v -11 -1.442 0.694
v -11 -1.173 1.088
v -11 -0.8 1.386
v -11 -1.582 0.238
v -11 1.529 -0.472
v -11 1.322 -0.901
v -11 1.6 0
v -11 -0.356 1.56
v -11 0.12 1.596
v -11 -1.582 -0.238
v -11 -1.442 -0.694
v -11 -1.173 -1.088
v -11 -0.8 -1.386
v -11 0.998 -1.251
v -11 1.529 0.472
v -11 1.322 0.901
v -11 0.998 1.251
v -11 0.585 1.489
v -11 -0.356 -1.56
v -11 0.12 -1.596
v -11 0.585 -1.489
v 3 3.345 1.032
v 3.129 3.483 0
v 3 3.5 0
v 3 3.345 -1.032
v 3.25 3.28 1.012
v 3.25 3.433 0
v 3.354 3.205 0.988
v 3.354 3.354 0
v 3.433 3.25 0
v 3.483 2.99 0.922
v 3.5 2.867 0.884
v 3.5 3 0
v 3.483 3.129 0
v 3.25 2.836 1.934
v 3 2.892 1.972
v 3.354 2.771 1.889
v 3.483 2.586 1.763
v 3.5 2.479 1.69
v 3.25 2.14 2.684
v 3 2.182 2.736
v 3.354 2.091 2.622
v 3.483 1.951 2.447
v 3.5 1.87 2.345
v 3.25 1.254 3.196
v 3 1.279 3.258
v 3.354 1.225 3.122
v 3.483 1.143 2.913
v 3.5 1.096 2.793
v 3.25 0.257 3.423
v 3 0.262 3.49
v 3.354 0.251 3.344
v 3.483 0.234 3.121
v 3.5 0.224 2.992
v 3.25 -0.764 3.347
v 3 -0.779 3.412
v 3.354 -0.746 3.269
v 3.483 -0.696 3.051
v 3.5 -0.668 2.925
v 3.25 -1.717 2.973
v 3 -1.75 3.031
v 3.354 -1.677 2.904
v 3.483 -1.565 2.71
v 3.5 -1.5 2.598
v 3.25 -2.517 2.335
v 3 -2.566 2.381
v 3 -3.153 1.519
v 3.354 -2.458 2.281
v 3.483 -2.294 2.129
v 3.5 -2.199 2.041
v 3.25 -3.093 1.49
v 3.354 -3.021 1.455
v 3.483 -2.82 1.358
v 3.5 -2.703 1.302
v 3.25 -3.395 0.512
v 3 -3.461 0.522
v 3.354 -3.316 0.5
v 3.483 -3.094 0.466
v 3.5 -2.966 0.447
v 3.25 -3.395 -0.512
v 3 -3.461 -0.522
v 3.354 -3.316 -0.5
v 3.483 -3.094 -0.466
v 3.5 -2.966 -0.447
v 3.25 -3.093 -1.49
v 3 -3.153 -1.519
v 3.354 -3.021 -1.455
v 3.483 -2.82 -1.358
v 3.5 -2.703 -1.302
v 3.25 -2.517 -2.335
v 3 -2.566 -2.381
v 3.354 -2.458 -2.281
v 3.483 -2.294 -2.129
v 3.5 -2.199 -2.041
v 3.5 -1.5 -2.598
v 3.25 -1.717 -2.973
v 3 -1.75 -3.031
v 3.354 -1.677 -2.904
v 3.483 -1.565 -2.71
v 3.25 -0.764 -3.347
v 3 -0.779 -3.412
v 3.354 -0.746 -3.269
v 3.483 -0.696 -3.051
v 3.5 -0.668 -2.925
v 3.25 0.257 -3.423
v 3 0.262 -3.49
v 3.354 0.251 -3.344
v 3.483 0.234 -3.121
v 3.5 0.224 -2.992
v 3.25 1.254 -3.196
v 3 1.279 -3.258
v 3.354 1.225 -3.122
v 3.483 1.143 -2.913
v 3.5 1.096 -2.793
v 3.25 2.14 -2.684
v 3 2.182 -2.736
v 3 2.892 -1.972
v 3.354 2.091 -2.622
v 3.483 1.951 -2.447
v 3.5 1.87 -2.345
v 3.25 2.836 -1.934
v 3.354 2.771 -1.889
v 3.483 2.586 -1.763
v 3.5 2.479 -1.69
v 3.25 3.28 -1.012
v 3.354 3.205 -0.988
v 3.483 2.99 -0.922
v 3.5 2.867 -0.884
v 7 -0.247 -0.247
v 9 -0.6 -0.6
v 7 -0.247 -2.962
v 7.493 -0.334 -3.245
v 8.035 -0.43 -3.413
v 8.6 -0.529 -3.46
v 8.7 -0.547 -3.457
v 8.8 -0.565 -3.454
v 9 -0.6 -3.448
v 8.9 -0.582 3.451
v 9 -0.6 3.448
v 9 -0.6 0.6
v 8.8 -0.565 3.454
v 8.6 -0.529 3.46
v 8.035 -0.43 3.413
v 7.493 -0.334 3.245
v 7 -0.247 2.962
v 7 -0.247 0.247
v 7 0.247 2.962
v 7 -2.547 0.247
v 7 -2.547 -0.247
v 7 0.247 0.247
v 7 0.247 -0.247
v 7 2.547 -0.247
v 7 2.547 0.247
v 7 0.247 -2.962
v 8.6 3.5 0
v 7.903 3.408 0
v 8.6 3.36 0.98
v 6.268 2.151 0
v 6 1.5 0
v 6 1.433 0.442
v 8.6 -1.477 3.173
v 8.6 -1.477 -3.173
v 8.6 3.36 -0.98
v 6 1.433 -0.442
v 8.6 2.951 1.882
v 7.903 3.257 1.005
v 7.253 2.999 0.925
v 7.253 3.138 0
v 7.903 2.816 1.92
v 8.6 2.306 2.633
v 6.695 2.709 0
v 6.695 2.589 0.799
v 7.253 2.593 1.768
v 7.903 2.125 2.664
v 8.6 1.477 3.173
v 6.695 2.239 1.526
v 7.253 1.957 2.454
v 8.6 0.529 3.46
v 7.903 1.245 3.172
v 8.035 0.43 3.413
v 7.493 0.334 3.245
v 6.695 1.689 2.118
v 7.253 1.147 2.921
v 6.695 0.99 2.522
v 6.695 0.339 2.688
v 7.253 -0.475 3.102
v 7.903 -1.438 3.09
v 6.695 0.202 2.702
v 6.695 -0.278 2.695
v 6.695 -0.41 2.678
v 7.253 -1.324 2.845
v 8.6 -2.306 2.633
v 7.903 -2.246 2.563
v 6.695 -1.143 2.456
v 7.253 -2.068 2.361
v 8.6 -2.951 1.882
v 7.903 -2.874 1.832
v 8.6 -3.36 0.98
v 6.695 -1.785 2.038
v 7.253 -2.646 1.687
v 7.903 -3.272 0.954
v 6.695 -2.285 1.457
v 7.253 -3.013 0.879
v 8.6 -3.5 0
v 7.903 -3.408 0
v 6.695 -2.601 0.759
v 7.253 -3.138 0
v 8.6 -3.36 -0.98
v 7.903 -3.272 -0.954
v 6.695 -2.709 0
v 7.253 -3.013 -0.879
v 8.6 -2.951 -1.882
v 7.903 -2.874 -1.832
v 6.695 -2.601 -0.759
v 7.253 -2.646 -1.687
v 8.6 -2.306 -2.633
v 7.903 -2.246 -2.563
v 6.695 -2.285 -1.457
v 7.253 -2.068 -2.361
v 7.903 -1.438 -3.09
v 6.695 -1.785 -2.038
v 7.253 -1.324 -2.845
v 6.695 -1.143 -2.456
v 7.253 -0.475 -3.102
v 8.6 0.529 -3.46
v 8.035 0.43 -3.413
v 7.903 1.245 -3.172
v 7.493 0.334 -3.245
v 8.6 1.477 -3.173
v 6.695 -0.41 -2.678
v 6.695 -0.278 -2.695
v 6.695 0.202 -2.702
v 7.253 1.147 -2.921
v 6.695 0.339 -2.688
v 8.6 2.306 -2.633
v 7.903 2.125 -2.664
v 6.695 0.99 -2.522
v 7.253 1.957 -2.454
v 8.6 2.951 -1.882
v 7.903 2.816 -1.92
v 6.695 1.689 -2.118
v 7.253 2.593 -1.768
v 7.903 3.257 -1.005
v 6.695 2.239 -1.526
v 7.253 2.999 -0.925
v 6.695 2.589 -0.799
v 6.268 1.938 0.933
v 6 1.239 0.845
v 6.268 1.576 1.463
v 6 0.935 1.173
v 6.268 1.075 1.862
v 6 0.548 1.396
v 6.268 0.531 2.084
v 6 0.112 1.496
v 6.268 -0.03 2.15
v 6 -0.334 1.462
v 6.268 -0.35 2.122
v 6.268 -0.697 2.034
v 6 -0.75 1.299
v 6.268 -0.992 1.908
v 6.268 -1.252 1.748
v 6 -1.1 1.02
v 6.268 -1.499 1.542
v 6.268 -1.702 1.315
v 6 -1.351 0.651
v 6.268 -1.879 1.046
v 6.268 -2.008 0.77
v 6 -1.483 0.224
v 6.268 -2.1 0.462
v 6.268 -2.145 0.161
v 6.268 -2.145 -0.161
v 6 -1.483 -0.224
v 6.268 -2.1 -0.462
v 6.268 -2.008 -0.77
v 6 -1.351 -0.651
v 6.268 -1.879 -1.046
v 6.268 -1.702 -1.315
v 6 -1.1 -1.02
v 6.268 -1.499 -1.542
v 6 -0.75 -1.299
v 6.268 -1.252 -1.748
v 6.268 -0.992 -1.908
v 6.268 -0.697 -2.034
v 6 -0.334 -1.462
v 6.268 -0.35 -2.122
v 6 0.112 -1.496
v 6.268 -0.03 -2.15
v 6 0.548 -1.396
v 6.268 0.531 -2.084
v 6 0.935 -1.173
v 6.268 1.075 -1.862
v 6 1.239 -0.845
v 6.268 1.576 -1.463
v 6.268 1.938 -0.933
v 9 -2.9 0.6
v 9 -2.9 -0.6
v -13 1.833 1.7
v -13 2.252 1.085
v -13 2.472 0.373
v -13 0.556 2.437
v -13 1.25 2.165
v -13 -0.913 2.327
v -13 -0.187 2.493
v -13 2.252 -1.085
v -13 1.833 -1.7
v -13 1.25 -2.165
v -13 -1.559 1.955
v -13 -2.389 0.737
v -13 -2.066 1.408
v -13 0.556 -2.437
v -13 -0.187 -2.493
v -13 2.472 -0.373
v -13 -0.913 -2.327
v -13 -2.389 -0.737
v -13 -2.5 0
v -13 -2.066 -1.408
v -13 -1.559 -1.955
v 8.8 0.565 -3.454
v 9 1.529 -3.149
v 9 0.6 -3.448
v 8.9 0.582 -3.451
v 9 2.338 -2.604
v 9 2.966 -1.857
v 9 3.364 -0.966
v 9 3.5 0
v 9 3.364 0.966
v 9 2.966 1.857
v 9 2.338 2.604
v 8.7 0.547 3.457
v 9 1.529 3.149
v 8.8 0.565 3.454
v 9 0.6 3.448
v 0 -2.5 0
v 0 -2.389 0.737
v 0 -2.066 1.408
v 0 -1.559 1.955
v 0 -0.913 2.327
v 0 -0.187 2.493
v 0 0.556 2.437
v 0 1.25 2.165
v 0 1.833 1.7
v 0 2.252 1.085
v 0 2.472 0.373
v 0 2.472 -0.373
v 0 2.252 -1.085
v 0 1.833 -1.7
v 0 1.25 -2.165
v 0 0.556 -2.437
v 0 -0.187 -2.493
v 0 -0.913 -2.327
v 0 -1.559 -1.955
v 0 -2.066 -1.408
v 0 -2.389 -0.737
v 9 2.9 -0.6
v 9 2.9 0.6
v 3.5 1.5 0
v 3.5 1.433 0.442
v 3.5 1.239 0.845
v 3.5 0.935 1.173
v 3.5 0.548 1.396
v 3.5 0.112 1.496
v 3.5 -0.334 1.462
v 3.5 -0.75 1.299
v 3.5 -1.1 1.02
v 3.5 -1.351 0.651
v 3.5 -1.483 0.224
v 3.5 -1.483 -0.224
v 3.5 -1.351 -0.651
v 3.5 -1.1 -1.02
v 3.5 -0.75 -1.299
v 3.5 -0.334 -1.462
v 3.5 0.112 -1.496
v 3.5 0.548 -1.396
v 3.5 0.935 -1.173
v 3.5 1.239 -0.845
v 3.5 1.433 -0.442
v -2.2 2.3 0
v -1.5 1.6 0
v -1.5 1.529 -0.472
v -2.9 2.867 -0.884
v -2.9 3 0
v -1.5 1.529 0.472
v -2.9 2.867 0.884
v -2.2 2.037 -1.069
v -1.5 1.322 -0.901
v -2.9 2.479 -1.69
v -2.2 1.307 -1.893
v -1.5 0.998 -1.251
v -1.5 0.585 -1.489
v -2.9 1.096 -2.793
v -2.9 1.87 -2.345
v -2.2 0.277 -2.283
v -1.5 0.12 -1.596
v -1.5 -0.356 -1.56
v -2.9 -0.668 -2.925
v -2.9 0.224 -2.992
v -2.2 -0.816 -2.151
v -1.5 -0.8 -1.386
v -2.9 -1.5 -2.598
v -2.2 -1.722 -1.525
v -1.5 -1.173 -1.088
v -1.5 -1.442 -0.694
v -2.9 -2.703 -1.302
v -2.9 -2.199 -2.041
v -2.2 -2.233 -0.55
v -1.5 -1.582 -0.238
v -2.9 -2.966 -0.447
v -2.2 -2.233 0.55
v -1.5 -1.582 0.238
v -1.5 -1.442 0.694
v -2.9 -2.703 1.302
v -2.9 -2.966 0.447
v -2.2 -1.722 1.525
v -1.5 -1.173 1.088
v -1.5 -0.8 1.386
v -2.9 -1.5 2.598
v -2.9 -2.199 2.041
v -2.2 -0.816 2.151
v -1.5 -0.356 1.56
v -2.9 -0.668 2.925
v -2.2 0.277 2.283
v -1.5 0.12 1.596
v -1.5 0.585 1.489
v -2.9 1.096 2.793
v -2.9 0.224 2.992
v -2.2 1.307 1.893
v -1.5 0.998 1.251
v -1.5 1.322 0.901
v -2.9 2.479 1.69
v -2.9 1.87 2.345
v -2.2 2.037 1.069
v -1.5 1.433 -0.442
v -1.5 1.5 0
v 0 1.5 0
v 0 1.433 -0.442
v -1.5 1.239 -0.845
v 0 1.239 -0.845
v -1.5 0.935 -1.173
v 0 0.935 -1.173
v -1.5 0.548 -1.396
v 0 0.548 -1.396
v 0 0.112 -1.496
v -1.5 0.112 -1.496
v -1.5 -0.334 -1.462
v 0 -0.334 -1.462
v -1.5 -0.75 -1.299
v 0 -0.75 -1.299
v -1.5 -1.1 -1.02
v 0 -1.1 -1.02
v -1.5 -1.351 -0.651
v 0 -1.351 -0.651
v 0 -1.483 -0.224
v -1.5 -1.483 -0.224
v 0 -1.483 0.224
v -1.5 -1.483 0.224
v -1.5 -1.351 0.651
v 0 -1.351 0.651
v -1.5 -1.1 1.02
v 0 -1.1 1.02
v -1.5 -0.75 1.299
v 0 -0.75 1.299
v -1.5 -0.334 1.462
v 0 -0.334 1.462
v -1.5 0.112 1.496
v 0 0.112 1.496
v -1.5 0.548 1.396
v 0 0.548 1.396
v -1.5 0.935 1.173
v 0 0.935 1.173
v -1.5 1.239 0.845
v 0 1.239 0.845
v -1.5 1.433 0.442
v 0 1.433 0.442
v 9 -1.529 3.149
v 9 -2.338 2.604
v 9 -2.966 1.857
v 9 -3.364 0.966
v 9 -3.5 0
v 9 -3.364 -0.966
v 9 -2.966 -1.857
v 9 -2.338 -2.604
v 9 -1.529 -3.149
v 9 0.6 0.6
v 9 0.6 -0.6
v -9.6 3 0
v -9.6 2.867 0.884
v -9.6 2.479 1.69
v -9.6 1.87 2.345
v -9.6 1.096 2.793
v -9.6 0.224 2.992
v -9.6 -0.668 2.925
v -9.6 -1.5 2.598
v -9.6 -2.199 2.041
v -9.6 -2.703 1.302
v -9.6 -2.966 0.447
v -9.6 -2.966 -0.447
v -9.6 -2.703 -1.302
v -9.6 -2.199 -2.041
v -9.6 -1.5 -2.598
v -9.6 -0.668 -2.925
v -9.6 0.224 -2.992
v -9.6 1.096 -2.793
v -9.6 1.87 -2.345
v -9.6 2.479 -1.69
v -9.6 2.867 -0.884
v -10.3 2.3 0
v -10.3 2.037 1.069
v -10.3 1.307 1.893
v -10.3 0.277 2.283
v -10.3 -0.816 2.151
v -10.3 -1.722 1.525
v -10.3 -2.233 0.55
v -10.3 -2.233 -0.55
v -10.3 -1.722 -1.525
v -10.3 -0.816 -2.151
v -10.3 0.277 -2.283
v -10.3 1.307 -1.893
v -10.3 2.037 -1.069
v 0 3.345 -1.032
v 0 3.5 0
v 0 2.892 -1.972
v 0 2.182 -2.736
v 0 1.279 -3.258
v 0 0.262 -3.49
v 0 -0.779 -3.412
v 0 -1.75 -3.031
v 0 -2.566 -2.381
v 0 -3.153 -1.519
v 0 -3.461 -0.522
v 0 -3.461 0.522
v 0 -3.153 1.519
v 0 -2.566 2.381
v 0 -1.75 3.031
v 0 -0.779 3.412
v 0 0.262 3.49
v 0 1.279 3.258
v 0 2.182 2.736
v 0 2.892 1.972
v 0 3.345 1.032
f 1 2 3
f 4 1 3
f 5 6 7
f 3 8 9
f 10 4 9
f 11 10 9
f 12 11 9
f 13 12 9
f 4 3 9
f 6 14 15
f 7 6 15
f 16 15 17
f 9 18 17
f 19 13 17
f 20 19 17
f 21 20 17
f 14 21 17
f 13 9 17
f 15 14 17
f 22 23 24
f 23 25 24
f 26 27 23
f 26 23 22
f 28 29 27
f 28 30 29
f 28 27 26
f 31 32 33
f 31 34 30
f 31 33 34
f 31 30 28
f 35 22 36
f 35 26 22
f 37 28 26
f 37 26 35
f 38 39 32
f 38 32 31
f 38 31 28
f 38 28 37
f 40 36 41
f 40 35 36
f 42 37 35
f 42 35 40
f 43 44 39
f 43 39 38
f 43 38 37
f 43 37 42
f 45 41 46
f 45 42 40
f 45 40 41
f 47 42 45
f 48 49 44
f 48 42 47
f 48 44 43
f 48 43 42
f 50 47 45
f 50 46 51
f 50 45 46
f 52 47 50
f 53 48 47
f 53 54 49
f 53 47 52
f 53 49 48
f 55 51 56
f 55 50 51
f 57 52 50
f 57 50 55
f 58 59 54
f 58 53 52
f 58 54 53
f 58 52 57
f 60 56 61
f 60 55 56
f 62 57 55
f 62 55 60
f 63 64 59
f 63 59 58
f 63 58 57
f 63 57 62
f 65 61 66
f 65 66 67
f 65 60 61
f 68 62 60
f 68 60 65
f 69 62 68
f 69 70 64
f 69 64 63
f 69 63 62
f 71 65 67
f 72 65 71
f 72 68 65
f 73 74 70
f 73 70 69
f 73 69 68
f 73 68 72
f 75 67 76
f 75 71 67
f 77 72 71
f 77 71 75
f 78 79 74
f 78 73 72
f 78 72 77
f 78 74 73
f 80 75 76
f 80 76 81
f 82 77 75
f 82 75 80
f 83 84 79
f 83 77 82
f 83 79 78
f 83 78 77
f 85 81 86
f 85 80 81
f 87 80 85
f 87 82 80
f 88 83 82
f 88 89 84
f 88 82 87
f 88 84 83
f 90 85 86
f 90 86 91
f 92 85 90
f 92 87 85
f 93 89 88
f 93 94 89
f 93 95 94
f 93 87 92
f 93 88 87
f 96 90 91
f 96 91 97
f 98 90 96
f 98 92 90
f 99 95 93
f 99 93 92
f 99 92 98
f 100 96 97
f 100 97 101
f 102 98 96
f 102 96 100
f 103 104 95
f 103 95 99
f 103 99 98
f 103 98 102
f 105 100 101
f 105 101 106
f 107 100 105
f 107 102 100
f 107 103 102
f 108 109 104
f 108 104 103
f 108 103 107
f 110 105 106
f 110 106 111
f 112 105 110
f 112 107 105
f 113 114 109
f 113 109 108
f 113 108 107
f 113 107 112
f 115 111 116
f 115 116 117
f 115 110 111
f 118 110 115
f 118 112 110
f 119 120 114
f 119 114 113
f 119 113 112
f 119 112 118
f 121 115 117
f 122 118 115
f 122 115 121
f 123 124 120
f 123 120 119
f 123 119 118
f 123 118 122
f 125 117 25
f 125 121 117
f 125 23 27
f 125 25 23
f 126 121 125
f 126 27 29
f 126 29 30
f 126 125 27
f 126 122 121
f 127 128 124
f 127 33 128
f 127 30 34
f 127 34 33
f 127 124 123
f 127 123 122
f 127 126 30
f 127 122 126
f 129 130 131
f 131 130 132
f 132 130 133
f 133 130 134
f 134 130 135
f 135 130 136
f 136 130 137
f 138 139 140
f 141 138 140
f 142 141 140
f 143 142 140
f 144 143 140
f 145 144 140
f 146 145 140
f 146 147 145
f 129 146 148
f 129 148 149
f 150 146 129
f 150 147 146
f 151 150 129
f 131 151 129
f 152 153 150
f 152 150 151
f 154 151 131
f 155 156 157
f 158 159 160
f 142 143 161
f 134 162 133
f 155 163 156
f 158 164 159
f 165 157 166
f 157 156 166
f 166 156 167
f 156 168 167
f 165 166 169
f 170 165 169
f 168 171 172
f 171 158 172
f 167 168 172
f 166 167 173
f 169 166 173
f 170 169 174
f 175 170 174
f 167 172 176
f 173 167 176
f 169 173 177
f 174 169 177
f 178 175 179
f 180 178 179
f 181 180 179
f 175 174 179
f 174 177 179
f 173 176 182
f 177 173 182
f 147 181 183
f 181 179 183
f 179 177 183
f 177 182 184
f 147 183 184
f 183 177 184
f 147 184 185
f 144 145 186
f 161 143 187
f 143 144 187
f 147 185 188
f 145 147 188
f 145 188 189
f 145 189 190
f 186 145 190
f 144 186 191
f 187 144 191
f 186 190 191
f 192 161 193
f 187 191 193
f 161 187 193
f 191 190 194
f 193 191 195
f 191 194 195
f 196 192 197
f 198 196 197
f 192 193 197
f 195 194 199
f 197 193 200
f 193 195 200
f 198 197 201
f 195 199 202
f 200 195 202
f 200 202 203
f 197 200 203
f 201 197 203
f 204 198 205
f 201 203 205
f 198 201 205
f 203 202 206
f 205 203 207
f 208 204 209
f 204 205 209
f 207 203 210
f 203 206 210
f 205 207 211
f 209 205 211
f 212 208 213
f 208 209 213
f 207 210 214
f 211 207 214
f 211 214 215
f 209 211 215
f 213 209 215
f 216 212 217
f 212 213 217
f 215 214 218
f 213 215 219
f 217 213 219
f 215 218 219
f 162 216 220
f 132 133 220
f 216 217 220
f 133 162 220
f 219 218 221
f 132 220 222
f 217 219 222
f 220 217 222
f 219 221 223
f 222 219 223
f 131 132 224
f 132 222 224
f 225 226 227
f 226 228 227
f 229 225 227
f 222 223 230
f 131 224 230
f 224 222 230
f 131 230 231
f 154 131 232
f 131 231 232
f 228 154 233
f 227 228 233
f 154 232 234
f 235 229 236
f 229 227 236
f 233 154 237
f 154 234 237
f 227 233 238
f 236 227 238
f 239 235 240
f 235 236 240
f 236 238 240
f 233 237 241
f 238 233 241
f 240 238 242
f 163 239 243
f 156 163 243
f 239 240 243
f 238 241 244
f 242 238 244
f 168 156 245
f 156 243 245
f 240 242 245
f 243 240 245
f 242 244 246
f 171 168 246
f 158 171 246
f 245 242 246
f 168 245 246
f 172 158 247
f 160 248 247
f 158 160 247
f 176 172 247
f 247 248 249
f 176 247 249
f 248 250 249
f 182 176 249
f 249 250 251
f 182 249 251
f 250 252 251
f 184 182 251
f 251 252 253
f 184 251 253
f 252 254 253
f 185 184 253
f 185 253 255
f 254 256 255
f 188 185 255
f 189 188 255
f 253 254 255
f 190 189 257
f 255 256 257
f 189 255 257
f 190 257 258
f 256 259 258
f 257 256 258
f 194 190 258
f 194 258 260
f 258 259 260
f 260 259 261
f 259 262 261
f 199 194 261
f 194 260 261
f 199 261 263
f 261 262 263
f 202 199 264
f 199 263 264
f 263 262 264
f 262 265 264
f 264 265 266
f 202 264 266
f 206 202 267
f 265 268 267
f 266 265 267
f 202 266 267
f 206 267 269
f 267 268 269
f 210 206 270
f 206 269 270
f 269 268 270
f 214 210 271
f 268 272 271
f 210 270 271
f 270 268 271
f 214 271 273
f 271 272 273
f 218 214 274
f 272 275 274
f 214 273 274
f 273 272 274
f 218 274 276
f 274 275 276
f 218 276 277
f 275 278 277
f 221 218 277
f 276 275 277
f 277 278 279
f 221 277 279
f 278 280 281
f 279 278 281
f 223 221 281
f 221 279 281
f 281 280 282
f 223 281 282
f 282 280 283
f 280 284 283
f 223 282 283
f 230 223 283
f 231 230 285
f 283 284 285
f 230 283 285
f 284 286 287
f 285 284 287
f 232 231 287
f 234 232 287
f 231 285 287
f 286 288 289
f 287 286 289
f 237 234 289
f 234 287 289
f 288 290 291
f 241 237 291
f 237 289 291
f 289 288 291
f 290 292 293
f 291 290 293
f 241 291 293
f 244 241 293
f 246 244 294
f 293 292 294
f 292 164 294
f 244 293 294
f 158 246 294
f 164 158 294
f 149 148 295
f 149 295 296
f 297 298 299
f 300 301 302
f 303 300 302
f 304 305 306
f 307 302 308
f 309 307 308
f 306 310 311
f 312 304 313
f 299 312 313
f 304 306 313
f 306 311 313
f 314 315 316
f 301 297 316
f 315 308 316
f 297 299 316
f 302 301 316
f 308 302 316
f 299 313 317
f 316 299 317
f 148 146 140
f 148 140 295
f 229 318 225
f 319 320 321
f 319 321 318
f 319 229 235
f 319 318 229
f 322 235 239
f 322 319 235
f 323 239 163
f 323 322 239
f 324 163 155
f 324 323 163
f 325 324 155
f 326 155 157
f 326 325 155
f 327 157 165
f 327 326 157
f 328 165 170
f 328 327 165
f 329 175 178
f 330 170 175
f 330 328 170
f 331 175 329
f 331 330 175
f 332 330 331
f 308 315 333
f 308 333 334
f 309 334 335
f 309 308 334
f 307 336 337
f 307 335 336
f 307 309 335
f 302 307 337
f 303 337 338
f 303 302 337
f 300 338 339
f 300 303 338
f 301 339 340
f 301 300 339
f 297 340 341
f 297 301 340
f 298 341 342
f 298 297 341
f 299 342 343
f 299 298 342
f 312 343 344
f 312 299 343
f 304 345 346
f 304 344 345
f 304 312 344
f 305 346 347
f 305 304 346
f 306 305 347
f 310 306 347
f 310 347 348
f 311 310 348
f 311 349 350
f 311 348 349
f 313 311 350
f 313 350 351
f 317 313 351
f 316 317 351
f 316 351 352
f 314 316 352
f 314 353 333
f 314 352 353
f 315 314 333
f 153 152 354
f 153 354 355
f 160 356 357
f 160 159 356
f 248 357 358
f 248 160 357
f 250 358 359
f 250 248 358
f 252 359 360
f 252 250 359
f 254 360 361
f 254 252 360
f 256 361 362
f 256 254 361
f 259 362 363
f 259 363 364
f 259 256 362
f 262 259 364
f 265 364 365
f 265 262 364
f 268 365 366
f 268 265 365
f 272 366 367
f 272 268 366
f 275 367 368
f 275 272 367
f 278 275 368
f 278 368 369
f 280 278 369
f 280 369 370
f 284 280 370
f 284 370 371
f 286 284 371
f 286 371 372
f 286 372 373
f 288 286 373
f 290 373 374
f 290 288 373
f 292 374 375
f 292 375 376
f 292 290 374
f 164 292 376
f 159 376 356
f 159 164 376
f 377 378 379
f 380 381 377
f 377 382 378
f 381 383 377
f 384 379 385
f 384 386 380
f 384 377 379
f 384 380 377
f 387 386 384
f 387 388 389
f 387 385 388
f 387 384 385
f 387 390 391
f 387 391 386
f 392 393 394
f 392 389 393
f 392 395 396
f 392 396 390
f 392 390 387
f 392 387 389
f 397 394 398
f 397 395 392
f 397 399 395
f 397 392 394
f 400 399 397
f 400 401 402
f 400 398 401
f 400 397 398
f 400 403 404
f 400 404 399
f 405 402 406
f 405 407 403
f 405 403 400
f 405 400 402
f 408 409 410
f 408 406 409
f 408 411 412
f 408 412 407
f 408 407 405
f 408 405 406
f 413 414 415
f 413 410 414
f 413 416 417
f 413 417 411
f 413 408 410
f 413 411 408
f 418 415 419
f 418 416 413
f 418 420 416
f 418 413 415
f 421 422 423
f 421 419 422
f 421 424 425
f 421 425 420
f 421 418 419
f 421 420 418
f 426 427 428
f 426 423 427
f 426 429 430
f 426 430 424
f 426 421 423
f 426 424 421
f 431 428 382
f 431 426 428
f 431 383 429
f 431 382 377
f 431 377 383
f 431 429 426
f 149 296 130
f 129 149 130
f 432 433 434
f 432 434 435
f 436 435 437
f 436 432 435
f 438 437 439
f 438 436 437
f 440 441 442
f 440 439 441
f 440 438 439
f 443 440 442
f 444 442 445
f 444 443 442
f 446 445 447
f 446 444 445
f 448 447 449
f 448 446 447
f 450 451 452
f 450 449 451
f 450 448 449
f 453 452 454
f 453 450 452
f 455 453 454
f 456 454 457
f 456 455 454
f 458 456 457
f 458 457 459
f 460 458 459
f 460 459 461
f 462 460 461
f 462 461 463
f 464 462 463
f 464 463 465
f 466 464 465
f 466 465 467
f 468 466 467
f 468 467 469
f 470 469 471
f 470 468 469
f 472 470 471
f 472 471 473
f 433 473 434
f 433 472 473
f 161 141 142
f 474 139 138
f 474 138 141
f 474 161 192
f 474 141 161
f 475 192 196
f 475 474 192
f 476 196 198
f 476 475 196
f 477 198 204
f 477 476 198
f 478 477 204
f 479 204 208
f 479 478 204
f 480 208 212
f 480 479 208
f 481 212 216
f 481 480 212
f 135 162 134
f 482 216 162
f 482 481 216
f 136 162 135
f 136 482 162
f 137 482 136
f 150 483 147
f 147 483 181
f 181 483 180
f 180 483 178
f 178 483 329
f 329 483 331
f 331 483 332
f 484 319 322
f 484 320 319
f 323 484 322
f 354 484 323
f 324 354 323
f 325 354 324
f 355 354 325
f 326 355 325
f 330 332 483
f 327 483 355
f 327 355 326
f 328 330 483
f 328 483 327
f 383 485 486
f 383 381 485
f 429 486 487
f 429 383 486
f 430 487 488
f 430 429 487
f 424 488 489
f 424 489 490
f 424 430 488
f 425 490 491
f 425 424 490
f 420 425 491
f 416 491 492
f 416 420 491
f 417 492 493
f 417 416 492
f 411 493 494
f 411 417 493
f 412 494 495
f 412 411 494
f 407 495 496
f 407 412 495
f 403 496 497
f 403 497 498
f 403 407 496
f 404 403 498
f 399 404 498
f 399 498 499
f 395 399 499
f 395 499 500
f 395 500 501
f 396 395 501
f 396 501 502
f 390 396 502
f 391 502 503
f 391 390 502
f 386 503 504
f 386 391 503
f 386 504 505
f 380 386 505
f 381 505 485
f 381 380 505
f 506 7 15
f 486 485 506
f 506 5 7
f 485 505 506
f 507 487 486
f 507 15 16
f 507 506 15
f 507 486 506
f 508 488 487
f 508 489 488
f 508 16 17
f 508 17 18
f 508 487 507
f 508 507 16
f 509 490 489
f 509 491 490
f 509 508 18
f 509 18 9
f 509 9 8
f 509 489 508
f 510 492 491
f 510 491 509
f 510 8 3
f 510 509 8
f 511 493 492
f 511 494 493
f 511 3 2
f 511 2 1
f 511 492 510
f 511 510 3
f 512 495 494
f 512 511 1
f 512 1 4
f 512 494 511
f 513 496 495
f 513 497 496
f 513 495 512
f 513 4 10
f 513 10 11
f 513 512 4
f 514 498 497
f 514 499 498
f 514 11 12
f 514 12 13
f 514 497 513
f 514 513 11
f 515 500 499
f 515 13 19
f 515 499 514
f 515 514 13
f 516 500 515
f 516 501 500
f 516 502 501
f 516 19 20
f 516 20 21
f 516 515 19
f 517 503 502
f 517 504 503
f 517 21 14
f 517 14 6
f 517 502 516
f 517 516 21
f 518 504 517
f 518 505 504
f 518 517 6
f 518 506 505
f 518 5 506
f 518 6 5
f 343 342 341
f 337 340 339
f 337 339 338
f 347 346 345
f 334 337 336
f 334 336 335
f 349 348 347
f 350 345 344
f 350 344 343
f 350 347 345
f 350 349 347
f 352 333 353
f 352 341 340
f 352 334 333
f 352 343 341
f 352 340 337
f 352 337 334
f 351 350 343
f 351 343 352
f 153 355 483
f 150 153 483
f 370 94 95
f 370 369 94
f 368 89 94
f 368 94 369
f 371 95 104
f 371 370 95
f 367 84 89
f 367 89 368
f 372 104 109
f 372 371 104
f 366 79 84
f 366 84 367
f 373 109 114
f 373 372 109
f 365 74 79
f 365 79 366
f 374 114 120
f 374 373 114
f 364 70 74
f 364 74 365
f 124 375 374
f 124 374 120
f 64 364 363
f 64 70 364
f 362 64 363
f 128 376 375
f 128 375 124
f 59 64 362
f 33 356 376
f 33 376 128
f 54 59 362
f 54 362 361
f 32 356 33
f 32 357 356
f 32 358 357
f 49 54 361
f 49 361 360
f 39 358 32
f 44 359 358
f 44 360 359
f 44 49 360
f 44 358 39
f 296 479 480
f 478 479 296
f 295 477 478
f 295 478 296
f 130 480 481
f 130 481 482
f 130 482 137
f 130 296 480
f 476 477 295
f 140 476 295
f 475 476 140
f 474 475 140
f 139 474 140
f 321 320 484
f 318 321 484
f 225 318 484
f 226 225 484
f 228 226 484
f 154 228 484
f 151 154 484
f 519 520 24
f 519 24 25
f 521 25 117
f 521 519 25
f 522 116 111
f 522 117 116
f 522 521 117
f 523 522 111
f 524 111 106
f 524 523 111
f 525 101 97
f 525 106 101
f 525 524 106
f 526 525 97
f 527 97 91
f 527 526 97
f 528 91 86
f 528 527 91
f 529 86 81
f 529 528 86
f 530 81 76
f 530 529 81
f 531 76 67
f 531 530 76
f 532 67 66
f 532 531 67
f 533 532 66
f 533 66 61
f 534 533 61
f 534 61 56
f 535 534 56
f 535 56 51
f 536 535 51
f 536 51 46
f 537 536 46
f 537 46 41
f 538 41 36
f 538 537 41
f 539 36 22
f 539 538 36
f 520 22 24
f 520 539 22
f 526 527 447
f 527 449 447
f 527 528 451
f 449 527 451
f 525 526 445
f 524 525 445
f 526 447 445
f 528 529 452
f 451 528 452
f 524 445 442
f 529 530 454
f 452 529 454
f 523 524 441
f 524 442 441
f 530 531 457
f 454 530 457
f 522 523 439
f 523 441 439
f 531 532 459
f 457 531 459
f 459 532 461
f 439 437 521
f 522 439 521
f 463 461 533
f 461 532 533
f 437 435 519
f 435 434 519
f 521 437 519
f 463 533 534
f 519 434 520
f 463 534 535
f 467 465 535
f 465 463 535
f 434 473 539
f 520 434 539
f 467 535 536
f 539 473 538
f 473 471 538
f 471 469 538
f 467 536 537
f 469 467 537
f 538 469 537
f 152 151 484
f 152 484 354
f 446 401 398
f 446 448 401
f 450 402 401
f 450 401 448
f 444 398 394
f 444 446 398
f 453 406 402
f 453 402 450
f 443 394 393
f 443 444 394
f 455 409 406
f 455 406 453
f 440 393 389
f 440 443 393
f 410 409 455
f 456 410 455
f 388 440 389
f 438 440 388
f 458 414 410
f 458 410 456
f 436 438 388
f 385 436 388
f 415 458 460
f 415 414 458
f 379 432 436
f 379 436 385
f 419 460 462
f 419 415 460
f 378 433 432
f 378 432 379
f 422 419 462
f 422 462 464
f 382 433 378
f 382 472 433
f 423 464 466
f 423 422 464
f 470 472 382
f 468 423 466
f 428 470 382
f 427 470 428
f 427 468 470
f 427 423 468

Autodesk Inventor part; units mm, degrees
ref_plane "YZ Plane" through (0, 0, 0) normal (1, 0, 0) x (0, 1, 0)
ref_plane "XZ Plane" through (0, 0, 0) normal (0, 1, 0) x (-1, 0, 0)
ref_plane "XY Plane" through (0, 0, 0) normal (0, 0, 1) x (1, 0, 0)
sketch "Sketch1" plane through (0, 0, 0) normal (0, 0, 1) x (1, 0, 0)
  line L0 (-19.8, 0) -> (13.8, 0) projected
  line L1 (0, 0) -> (3.5, 0)
  line L2 (3.5, 0) -> (3.5, 3.5)
  line L3 (3.5, 3.5) -> (0, 3.5)
  line L4 (0, 3.5) -> (0, 0)
  line L5 (3.5, 1.5) -> (6, 1.5)
  arc A0 (8.6, 3.5) -> (6, 1.5) centre (8.6, 0.81) ccw
  line L6 (8.6, 3.5) -> (9, 3.5)
  line L7 (9, 3.5) -> (9, 0)
  line L8 (0, 1.5) -> (-1.5, 1.5)
  line L9 (-1.5, 1.5) -> (-1.5, 0)
  line L10 (-1.5, 0) -> (0, 0)
  line L11 (0, 0) -> (0, 1.5)
  line L12 (-11, 3) -> (-1.5, 3)
  line L13 (-1.5, 3) -> (-1.5, 0)
  line L14 (-1.5, 0) -> (-11, 0)
  line L15 (-11, 0) -> (-11, 3)
  point P0 (-11, 0)
  dimension "d0" = 7
  dimension "d1" = 9
  dimension "d2" = 0.4
  dimension "d18" = 3.5
  dimension "d19" = 3
  dimension "d20" = 2.5
  dimension "d21" = 1.5
  dimension "d22" = 6
  dimension "L" = 11
revolve "Revolution1" add sketch "Sketch1" angle 360 about axis through (-10, 0, 0) along (1, 0, 0)
chamfer "Chamfer1" distance 1.4 angle 45 2 edges at (-1.5, -3, 0) (-11, -3, 0)
fillet "Fillet1" radius 0.5 1 edges at (3.5, -3.5, 0)
sketch "Sketch3" plane through (9, 0, 0) normal (1, 0, 0) x (0, 0, -1)
  line L0 (-3.7, 0.6) -> (3.7, 0.6)
  line L1 (3.7, 0.6) -> (3.7, -0.6)
  line L2 (3.7, -0.6) -> (-3.7, -0.6)
  line L3 (-3.7, -0.6) -> (-3.7, 0.6)
  line L4 (-3.7, 0.6) -> (3.7, -0.6) construction
  line L5 (3.7, 0.6) -> (-3.7, -0.6) construction
  line L6 (-0.6, 2.9) -> (0.6, 2.9)
  line L7 (0.6, 2.9) -> (0.6, -2.9)
  line L8 (0.6, -2.9) -> (-0.6, -2.9)
  line L9 (-0.6, -2.9) -> (-0.6, 2.9)
  line L10 (-0.6, 2.9) -> (0.6, -2.9) construction
  line L11 (0.6, 2.9) -> (-0.6, -2.9) construction
  circle A0 centre (0, 0) radius 3.5 construction
  point P0 (-0.6, 3.448188)
  point P1 (-0.6, 0.6)
  point P2 (-3.448188, 0.6)
  point P3 (-3.448188, -0.6)
  point P4 (-0.6, -0.6)
  point P5 (-0.6, -3.448188)
  point P6 (0.6, -3.448188)
  point P7 (0.6, -0.6)
  point P8 (3.448188, -0.6)
  point P9 (3.448188, 0.6)
  point P10 (0.6, 0.6)
  point P11 (0.6, 3.448188)
  dimension "d28" = 1.2
  dimension "d31" = 0.2
  dimension "d32" = 0.6
sketch "Sketch3 outline for Extrusion1" plane through (9, 0, 0) normal (1, 0, 0) x (0, 0, -1)
  line L0 (-0.6, 0.6) -> (-3.7, 0.6)
  line L1 (-3.7, 0.6) -> (-3.7, -0.6)
  line L2 (-3.7, -0.6) -> (-0.6, -0.6)
  line L3 (-0.6, -0.6) -> (-0.6, -2.9)
  line L4 (-0.6, -2.9) -> (0.6, -2.9)
  line L5 (0.6, -2.9) -> (0.6, -0.6)
  line L6 (0.6, -0.6) -> (3.7, -0.6)
  line L7 (3.7, -0.6) -> (3.7, 0.6)
  line L8 (3.7, 0.6) -> (0.6, 0.6)
  line L9 (0.6, 0.6) -> (0.6, 2.9)
  line L10 (0.6, 2.9) -> (-0.6, 2.9)
  line L11 (-0.6, 2.9) -> (-0.6, 0.6)
extrude "Extrusion1" cut sketch "Sketch3 outline for Extrusion1" against normal blind 2 draft -10
thread "Thread1" size "TR8x1.5" class "7e" standard "ISO Metric Trapezoidal Threads" full length
sketch "Sketch4" plane through (0, 0, 0) normal (0, 0, 1) x (1, 0, 0)
  line L0 (-20.4, 0) -> (3.4, 0) projected
  line L1 (-13, 0) -> (0, 0)
  line L2 (0, 0) -> (0, -2.5)
  line L3 (0, -2.5) -> (-13, -2.5)
  line L4 (-13, -2.5) -> (-13, 0)
  line L5 (0, -3.5) -> (0, 3.5) projected
  line L6 (-11, -1.6) -> (-11, 1.6) projected
  point P0 (0, 0)
  point P1 (0, 0)
  dimension "d36" = 2
  dimension "d37" = 5
revolve "Revolution2" add sketch "Sketch4" angle 360 about axis through (-10, 0, 0) along (1, 0, 0) separate body
properties part number "263.20.150" material "Stainless Steel"
